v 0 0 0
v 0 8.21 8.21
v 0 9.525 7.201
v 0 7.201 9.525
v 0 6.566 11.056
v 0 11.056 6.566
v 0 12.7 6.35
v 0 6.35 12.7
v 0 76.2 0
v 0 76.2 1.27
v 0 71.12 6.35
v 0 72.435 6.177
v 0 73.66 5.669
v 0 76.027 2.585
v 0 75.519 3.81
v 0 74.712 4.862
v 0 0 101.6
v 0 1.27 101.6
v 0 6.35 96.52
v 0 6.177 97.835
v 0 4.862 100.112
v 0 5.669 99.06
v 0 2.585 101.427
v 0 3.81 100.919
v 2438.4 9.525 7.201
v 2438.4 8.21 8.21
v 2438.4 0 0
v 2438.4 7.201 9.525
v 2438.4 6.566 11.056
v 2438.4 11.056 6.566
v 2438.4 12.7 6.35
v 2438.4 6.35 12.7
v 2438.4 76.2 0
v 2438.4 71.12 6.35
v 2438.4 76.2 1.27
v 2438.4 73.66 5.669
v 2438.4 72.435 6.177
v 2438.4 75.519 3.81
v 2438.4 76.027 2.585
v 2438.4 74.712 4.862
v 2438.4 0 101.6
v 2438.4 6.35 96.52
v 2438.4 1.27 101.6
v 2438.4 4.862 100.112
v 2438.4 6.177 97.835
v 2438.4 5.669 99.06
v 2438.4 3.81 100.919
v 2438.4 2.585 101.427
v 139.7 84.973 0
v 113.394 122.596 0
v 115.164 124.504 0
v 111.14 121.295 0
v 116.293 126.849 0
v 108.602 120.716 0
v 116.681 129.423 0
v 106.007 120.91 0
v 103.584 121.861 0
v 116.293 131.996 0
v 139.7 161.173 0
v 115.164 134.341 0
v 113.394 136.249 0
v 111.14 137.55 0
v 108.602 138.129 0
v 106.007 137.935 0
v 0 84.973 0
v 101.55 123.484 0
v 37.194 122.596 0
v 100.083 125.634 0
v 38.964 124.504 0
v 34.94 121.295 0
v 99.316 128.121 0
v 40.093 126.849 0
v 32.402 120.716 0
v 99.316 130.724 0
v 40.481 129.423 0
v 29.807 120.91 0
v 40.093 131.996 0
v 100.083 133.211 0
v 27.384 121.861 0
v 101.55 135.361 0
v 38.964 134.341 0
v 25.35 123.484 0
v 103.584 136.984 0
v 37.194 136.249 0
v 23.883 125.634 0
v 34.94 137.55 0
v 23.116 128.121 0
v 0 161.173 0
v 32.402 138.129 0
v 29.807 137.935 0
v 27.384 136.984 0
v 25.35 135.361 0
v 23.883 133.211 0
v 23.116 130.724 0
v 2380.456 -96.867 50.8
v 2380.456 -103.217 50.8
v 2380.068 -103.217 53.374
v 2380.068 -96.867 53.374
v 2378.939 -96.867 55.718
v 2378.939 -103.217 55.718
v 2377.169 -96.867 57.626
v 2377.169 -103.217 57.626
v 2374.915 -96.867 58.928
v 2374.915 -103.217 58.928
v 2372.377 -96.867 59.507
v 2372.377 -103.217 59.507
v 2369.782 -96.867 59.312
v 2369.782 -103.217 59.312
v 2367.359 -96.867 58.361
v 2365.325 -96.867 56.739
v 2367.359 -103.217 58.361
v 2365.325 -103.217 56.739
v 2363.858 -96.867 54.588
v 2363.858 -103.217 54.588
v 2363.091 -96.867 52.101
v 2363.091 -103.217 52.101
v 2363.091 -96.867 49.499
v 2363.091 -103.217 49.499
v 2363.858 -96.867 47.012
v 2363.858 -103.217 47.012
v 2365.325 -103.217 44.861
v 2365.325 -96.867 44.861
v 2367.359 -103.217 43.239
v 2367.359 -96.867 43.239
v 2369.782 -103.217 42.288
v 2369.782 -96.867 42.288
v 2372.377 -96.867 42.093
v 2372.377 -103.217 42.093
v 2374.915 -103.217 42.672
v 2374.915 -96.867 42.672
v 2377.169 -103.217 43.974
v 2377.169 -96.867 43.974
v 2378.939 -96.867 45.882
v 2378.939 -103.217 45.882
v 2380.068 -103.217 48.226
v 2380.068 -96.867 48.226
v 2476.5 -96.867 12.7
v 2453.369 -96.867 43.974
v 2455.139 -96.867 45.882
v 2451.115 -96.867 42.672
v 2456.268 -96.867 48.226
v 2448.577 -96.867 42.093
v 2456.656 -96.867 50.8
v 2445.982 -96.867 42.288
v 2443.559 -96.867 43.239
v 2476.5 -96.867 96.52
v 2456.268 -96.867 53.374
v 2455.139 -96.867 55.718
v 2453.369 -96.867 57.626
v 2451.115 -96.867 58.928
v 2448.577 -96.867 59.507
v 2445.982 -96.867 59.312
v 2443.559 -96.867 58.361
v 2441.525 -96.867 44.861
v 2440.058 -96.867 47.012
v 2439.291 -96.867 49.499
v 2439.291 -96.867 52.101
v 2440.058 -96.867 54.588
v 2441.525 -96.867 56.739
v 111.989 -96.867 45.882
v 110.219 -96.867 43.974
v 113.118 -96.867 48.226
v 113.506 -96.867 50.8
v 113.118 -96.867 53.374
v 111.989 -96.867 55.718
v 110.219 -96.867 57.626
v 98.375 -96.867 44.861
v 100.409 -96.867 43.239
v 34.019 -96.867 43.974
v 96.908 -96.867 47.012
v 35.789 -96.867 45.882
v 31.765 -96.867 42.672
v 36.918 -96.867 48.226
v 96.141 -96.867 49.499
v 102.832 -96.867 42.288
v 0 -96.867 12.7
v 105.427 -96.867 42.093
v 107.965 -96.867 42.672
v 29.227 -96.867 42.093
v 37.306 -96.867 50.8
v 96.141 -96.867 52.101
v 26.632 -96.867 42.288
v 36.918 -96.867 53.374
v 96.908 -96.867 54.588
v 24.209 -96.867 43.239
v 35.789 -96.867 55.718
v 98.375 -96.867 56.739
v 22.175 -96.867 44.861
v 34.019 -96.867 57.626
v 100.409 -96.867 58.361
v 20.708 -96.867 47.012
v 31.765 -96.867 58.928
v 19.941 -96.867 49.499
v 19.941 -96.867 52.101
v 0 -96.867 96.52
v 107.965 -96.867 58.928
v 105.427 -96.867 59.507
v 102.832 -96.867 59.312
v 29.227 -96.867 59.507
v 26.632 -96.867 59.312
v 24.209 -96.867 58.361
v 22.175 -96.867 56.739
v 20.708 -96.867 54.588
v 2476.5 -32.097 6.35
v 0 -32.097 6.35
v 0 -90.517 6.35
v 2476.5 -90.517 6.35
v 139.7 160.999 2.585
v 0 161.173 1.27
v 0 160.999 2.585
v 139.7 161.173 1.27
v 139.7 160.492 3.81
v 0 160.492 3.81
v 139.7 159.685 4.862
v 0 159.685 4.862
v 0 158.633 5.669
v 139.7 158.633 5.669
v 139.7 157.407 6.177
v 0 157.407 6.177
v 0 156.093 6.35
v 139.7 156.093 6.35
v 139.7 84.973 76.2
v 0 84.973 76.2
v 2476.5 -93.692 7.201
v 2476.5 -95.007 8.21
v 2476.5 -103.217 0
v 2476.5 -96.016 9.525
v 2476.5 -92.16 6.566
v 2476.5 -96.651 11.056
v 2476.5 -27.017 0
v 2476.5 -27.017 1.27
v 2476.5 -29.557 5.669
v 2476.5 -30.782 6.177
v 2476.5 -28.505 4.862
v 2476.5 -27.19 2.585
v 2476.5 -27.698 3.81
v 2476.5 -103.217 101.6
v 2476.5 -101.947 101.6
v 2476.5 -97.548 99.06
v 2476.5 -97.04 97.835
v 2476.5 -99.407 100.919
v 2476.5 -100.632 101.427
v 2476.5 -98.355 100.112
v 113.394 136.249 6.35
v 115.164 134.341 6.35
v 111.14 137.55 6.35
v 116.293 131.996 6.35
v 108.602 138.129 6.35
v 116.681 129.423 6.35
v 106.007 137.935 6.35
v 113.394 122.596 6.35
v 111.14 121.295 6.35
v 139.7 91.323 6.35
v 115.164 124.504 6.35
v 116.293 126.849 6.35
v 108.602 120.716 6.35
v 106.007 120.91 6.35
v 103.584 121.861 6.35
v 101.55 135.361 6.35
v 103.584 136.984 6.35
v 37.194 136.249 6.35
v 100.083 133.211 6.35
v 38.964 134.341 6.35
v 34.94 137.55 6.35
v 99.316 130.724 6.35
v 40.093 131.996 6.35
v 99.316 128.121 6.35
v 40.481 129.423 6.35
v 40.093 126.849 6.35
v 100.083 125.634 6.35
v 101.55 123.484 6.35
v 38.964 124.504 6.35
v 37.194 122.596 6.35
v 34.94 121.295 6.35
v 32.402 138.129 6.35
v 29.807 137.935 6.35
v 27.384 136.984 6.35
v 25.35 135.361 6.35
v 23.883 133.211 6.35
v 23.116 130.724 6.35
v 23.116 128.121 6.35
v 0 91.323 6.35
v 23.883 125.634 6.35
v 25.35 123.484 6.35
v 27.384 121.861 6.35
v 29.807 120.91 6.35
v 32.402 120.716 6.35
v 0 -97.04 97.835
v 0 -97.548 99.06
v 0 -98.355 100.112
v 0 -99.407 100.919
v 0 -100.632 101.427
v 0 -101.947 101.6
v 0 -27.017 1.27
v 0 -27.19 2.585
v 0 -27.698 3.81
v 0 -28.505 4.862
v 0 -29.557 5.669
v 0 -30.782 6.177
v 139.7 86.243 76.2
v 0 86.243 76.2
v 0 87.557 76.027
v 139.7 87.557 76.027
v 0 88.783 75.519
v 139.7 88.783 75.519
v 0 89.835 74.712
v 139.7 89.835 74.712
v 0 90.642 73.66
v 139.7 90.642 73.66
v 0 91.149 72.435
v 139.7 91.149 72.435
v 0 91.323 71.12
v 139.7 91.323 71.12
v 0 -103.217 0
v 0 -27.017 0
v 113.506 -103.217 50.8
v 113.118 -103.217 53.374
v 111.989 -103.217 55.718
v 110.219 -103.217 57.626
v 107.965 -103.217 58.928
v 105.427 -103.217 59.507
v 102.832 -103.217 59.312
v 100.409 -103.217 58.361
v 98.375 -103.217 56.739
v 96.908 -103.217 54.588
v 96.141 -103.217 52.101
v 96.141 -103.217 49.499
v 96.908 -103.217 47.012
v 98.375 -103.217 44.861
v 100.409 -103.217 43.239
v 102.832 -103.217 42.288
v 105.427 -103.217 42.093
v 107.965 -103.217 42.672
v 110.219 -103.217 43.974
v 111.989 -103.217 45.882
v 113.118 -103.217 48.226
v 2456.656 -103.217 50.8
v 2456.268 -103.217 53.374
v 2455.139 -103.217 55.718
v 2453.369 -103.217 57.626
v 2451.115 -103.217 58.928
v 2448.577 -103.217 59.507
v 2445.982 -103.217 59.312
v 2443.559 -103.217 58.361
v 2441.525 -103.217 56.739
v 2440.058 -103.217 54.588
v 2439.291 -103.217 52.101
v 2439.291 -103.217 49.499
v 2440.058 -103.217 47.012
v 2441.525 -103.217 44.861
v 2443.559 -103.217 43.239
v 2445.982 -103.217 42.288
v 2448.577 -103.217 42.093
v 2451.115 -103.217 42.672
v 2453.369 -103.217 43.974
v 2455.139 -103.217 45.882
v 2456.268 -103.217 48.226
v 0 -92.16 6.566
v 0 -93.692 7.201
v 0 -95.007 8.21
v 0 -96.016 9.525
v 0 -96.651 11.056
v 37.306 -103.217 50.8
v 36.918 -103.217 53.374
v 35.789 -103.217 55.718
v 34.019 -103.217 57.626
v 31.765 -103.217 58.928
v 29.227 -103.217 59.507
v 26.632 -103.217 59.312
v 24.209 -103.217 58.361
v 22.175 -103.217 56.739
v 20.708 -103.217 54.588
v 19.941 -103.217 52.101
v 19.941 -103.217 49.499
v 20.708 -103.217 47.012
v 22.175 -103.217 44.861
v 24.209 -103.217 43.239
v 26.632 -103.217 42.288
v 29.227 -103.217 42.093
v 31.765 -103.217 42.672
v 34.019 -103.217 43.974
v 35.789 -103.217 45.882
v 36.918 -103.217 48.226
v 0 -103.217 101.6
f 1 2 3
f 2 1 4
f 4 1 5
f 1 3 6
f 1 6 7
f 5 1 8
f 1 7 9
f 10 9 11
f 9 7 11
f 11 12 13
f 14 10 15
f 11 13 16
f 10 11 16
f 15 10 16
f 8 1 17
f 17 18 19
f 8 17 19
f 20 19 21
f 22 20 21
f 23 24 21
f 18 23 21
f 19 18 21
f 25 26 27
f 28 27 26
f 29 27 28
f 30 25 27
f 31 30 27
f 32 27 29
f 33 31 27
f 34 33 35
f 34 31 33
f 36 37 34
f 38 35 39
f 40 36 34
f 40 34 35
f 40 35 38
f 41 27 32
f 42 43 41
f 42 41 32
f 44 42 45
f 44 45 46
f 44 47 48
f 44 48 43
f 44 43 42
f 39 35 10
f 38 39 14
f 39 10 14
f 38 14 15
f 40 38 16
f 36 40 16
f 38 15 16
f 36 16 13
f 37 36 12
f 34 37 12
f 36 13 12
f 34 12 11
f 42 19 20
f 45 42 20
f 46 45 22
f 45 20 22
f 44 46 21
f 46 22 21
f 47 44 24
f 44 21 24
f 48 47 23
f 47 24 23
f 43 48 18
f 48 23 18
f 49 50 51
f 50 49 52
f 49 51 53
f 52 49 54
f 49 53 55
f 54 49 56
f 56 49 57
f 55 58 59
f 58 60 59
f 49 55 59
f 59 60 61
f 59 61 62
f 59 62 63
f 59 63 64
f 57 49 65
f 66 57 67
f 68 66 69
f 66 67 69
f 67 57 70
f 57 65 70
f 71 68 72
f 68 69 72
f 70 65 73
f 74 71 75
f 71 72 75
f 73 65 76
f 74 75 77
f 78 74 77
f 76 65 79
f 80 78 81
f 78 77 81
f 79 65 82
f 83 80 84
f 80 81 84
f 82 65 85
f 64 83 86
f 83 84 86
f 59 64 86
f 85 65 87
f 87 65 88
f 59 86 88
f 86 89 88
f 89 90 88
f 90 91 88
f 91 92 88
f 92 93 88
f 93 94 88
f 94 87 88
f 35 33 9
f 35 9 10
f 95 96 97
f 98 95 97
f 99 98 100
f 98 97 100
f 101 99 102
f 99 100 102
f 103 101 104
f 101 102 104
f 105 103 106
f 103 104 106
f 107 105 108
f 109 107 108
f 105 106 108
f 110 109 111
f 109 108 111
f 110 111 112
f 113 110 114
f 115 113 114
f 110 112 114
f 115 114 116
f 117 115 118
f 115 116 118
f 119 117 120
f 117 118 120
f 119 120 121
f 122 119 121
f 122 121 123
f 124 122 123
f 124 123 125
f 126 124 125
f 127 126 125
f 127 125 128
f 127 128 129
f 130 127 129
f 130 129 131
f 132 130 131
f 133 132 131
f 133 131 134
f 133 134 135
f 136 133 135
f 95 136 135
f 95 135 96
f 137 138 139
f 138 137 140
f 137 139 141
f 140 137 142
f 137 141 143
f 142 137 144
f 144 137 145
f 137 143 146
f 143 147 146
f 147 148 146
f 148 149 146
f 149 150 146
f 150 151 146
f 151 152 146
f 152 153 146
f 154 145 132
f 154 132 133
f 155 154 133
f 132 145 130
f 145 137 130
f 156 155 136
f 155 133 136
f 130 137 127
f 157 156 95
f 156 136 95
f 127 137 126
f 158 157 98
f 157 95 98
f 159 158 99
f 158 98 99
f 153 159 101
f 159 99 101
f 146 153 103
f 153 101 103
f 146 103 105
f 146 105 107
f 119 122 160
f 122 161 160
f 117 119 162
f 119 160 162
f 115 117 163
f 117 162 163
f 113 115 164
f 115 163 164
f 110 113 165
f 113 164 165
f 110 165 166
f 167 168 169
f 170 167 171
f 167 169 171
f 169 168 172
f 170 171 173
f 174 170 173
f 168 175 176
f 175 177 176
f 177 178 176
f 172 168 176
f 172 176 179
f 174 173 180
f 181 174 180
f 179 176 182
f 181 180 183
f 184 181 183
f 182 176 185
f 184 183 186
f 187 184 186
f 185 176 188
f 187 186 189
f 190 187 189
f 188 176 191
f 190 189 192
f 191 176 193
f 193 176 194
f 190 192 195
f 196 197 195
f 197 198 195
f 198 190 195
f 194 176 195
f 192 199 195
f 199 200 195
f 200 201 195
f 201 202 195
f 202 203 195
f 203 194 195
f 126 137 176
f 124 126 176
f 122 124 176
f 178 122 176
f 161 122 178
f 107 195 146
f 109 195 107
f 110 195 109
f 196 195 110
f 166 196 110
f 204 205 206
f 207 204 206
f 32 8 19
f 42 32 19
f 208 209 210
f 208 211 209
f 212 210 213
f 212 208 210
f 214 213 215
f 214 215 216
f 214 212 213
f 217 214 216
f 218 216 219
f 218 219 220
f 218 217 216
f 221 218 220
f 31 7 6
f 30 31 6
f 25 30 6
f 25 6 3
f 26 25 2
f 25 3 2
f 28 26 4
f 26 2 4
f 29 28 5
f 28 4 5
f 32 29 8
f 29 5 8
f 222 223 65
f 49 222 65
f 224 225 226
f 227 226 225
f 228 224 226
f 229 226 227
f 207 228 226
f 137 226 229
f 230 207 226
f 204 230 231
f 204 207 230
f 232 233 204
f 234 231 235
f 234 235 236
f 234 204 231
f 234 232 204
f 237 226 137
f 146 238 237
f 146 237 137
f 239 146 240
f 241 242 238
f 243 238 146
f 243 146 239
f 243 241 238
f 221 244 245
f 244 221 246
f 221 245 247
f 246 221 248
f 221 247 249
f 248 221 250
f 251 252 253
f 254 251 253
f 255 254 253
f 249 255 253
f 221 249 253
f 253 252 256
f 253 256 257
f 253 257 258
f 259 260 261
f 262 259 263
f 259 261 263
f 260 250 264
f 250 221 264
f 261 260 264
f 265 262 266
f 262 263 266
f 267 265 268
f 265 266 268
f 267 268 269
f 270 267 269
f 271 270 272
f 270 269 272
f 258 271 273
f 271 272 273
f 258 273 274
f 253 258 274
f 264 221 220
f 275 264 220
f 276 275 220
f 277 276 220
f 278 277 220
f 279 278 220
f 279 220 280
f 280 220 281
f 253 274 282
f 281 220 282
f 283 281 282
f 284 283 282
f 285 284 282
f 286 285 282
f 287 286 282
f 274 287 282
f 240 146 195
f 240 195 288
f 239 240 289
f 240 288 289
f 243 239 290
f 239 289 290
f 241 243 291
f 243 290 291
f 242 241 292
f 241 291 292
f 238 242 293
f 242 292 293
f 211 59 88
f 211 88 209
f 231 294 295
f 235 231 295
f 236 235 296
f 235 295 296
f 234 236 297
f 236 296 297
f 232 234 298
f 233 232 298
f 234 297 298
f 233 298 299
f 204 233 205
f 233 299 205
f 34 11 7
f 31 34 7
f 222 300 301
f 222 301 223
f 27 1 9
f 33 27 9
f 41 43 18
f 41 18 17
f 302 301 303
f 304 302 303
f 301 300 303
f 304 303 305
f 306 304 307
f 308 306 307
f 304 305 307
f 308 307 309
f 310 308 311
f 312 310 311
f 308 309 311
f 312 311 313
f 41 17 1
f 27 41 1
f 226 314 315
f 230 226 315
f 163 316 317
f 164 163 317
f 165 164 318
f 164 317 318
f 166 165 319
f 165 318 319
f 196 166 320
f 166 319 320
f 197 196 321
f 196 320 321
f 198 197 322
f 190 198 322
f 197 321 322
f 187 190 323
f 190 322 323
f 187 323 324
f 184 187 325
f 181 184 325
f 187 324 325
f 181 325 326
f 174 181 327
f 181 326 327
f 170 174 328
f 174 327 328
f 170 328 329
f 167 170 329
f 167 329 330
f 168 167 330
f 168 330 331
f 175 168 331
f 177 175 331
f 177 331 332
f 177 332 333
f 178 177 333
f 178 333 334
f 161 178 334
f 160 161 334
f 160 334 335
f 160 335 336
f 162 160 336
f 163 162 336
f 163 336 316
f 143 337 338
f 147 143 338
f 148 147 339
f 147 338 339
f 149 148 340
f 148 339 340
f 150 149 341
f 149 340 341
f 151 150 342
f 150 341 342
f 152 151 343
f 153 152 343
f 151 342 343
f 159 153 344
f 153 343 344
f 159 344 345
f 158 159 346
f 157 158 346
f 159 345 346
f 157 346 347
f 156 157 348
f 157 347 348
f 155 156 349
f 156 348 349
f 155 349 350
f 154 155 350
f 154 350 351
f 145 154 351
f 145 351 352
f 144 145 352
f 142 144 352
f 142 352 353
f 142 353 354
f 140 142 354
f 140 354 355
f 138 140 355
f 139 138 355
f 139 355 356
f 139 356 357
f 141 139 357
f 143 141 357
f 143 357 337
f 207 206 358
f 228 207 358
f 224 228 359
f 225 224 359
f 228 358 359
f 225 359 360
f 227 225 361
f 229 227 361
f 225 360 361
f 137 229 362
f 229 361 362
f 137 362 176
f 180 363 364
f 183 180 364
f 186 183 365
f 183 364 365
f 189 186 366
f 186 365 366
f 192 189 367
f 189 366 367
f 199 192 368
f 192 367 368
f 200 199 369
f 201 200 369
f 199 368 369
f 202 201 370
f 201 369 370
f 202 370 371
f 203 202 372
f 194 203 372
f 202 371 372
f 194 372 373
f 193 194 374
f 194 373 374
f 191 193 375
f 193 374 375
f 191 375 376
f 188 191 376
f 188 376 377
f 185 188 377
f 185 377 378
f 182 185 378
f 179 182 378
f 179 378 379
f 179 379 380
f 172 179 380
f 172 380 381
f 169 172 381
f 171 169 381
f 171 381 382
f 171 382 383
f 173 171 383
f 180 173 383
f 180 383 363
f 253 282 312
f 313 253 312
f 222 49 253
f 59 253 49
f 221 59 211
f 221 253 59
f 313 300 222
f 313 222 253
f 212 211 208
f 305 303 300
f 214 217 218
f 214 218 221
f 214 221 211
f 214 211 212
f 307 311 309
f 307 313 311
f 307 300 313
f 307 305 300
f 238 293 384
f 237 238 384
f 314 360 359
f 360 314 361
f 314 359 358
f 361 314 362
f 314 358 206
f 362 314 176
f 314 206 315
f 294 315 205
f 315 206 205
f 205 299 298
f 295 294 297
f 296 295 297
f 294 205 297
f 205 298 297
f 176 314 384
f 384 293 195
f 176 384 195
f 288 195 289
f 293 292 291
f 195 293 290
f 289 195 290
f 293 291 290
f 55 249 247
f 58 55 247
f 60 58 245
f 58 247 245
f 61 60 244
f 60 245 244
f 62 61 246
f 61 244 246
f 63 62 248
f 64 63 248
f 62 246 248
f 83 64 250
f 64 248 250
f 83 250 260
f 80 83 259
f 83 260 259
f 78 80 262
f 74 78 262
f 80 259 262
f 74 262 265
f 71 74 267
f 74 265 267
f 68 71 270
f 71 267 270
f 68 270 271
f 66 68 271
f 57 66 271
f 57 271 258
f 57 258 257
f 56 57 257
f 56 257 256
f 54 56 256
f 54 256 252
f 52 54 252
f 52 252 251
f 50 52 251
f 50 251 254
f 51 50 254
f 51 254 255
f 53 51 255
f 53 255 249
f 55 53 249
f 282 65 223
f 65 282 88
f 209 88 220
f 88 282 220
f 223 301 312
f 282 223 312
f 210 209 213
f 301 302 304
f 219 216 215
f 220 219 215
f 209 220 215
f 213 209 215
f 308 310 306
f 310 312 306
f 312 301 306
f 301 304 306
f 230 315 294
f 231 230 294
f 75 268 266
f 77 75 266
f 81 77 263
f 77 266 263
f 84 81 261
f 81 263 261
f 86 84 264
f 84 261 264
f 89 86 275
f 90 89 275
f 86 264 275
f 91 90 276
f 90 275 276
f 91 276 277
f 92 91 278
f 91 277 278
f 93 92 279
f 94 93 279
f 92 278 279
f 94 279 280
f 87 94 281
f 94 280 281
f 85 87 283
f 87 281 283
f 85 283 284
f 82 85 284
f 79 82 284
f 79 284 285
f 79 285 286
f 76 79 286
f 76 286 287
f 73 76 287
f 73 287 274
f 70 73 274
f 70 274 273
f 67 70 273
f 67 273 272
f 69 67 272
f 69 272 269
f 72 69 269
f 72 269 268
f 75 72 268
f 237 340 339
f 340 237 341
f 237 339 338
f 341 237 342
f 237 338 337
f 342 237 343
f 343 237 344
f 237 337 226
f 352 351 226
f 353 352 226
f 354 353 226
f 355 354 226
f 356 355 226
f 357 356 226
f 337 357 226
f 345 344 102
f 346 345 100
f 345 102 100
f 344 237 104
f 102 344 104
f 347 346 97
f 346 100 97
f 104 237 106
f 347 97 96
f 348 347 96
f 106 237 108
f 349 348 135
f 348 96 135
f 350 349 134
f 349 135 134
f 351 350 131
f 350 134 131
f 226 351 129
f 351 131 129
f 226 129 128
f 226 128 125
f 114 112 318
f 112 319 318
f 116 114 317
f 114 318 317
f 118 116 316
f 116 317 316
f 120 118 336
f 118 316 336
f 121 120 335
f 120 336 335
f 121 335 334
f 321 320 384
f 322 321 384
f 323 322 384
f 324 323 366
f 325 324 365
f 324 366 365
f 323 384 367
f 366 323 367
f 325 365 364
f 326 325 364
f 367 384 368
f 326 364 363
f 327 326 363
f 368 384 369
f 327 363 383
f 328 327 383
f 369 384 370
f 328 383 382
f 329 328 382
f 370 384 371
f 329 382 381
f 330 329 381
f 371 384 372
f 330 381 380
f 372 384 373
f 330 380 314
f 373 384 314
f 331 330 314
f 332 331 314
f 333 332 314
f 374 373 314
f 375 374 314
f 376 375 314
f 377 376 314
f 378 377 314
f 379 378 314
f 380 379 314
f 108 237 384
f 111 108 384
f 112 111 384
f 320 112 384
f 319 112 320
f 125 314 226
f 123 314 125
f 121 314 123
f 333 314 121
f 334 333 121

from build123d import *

# Parameters (mm, degrees)
F1_DEPTH  = 2438.4
F3_DEPTH  = 2476.5
F5_DEPTH  = 139.7
F6_R      = 5.08
F7_R      = 8.73125
F8_DEPTH  = 6.351
F9_R      = 8.73125
F10_DEPTH = 25.4


with BuildPart() as f1:
    # F0 (on Right) → F1 (new body)
    with BuildSketch(Plane.YZ):
        with BuildLine():
            Line((0, 101.6), (0, 0))
            Line((0, 0), (76.2, 0))
            Line((76.2, 0), (76.2, 1.27))
            ThreePointArc((76.2, 1.27), (74.712102, 4.862102), (71.12, 6.35))
            Line((71.12, 6.35), (12.7, 6.35))
            ThreePointArc((12.7, 6.35), (8.209872, 8.209872), (6.35, 12.7))
            Line((6.35, 12.7), (6.35, 96.52))
            ThreePointArc((6.35, 96.52), (4.862102, 100.112102), (1.27, 101.6))
            Line((1.27, 101.6), (0, 101.6))
        make_face()
    extrude(amount=F1_DEPTH)


with BuildPart() as f3:
    # F2 (on Right) → F3 (new body)
    with BuildSketch(Plane.YZ):
        with BuildLine():
            ThreePointArc((-90.516991, 6.35), (-95.007119, 8.209872), (-96.866991, 12.7))
            Line((-96.866991, 12.7), (-96.866991, 96.52))
            ThreePointArc((-96.866991, 96.52), (-98.354888, 100.112102), (-101.946991, 101.6))
            Line((-101.946991, 101.6), (-103.216991, 101.6))
            Line((-103.216991, 101.6), (-103.216991, 0))
            Line((-103.216991, 0), (-27.016991, 0))
            Line((-27.016991, 0), (-27.016991, 1.27))
            ThreePointArc((-27.016991, 1.27), (-28.504888, 4.862102), (-32.096991, 6.35))
            Line((-32.096991, 6.35), (-90.516991, 6.35))
        make_face()
    extrude(amount=F3_DEPTH)

    # F9 (on face) → F10 (cut)
    with BuildSketch(Plane.XZ.offset(103.216991)):
        with Locations((28.575, 50.8)):
            Circle(F9_R)
        with Locations((104.775, 50.8)):
            Circle(F9_R)
        with Locations((2447.925, 50.8)):
            Circle(F9_R)
        with Locations((2371.725, 50.8)):
            Circle(F9_R)
    extrude(amount=-F10_DEPTH, mode=Mode.SUBTRACT)


with BuildPart() as f5:
    # F4 (on Right) → F5 (new body)
    with BuildSketch(Plane.YZ):
        Polygon((91.322563, 76.2), (84.972563, 76.2), (84.972563, 0), (161.172563, 0), (161.172563, 6.35), (91.322563, 6.35), align=None)
    extrude(amount=F5_DEPTH)

    # F6
    f6_edges = [f5.edges().sort_by_distance(p)[0] for p in [
        (69.85, 91.322563, 76.2),
        (69.85, 161.172563, 6.35),
    ]]
    fillet(f6_edges, radius=F6_R)

    # F7 (on face) → F8 (cut, through all)
    with BuildSketch(Plane.XY.offset(6.35)):
        with Locations((31.75, 129.422563)):
            Circle(F7_R)
        with Locations((107.95, 129.422563)):
            Circle(F7_R)
    extrude(amount=-F8_DEPTH, mode=Mode.SUBTRACT)


solid = Compound([f1.part, f3.part, f5.part])
